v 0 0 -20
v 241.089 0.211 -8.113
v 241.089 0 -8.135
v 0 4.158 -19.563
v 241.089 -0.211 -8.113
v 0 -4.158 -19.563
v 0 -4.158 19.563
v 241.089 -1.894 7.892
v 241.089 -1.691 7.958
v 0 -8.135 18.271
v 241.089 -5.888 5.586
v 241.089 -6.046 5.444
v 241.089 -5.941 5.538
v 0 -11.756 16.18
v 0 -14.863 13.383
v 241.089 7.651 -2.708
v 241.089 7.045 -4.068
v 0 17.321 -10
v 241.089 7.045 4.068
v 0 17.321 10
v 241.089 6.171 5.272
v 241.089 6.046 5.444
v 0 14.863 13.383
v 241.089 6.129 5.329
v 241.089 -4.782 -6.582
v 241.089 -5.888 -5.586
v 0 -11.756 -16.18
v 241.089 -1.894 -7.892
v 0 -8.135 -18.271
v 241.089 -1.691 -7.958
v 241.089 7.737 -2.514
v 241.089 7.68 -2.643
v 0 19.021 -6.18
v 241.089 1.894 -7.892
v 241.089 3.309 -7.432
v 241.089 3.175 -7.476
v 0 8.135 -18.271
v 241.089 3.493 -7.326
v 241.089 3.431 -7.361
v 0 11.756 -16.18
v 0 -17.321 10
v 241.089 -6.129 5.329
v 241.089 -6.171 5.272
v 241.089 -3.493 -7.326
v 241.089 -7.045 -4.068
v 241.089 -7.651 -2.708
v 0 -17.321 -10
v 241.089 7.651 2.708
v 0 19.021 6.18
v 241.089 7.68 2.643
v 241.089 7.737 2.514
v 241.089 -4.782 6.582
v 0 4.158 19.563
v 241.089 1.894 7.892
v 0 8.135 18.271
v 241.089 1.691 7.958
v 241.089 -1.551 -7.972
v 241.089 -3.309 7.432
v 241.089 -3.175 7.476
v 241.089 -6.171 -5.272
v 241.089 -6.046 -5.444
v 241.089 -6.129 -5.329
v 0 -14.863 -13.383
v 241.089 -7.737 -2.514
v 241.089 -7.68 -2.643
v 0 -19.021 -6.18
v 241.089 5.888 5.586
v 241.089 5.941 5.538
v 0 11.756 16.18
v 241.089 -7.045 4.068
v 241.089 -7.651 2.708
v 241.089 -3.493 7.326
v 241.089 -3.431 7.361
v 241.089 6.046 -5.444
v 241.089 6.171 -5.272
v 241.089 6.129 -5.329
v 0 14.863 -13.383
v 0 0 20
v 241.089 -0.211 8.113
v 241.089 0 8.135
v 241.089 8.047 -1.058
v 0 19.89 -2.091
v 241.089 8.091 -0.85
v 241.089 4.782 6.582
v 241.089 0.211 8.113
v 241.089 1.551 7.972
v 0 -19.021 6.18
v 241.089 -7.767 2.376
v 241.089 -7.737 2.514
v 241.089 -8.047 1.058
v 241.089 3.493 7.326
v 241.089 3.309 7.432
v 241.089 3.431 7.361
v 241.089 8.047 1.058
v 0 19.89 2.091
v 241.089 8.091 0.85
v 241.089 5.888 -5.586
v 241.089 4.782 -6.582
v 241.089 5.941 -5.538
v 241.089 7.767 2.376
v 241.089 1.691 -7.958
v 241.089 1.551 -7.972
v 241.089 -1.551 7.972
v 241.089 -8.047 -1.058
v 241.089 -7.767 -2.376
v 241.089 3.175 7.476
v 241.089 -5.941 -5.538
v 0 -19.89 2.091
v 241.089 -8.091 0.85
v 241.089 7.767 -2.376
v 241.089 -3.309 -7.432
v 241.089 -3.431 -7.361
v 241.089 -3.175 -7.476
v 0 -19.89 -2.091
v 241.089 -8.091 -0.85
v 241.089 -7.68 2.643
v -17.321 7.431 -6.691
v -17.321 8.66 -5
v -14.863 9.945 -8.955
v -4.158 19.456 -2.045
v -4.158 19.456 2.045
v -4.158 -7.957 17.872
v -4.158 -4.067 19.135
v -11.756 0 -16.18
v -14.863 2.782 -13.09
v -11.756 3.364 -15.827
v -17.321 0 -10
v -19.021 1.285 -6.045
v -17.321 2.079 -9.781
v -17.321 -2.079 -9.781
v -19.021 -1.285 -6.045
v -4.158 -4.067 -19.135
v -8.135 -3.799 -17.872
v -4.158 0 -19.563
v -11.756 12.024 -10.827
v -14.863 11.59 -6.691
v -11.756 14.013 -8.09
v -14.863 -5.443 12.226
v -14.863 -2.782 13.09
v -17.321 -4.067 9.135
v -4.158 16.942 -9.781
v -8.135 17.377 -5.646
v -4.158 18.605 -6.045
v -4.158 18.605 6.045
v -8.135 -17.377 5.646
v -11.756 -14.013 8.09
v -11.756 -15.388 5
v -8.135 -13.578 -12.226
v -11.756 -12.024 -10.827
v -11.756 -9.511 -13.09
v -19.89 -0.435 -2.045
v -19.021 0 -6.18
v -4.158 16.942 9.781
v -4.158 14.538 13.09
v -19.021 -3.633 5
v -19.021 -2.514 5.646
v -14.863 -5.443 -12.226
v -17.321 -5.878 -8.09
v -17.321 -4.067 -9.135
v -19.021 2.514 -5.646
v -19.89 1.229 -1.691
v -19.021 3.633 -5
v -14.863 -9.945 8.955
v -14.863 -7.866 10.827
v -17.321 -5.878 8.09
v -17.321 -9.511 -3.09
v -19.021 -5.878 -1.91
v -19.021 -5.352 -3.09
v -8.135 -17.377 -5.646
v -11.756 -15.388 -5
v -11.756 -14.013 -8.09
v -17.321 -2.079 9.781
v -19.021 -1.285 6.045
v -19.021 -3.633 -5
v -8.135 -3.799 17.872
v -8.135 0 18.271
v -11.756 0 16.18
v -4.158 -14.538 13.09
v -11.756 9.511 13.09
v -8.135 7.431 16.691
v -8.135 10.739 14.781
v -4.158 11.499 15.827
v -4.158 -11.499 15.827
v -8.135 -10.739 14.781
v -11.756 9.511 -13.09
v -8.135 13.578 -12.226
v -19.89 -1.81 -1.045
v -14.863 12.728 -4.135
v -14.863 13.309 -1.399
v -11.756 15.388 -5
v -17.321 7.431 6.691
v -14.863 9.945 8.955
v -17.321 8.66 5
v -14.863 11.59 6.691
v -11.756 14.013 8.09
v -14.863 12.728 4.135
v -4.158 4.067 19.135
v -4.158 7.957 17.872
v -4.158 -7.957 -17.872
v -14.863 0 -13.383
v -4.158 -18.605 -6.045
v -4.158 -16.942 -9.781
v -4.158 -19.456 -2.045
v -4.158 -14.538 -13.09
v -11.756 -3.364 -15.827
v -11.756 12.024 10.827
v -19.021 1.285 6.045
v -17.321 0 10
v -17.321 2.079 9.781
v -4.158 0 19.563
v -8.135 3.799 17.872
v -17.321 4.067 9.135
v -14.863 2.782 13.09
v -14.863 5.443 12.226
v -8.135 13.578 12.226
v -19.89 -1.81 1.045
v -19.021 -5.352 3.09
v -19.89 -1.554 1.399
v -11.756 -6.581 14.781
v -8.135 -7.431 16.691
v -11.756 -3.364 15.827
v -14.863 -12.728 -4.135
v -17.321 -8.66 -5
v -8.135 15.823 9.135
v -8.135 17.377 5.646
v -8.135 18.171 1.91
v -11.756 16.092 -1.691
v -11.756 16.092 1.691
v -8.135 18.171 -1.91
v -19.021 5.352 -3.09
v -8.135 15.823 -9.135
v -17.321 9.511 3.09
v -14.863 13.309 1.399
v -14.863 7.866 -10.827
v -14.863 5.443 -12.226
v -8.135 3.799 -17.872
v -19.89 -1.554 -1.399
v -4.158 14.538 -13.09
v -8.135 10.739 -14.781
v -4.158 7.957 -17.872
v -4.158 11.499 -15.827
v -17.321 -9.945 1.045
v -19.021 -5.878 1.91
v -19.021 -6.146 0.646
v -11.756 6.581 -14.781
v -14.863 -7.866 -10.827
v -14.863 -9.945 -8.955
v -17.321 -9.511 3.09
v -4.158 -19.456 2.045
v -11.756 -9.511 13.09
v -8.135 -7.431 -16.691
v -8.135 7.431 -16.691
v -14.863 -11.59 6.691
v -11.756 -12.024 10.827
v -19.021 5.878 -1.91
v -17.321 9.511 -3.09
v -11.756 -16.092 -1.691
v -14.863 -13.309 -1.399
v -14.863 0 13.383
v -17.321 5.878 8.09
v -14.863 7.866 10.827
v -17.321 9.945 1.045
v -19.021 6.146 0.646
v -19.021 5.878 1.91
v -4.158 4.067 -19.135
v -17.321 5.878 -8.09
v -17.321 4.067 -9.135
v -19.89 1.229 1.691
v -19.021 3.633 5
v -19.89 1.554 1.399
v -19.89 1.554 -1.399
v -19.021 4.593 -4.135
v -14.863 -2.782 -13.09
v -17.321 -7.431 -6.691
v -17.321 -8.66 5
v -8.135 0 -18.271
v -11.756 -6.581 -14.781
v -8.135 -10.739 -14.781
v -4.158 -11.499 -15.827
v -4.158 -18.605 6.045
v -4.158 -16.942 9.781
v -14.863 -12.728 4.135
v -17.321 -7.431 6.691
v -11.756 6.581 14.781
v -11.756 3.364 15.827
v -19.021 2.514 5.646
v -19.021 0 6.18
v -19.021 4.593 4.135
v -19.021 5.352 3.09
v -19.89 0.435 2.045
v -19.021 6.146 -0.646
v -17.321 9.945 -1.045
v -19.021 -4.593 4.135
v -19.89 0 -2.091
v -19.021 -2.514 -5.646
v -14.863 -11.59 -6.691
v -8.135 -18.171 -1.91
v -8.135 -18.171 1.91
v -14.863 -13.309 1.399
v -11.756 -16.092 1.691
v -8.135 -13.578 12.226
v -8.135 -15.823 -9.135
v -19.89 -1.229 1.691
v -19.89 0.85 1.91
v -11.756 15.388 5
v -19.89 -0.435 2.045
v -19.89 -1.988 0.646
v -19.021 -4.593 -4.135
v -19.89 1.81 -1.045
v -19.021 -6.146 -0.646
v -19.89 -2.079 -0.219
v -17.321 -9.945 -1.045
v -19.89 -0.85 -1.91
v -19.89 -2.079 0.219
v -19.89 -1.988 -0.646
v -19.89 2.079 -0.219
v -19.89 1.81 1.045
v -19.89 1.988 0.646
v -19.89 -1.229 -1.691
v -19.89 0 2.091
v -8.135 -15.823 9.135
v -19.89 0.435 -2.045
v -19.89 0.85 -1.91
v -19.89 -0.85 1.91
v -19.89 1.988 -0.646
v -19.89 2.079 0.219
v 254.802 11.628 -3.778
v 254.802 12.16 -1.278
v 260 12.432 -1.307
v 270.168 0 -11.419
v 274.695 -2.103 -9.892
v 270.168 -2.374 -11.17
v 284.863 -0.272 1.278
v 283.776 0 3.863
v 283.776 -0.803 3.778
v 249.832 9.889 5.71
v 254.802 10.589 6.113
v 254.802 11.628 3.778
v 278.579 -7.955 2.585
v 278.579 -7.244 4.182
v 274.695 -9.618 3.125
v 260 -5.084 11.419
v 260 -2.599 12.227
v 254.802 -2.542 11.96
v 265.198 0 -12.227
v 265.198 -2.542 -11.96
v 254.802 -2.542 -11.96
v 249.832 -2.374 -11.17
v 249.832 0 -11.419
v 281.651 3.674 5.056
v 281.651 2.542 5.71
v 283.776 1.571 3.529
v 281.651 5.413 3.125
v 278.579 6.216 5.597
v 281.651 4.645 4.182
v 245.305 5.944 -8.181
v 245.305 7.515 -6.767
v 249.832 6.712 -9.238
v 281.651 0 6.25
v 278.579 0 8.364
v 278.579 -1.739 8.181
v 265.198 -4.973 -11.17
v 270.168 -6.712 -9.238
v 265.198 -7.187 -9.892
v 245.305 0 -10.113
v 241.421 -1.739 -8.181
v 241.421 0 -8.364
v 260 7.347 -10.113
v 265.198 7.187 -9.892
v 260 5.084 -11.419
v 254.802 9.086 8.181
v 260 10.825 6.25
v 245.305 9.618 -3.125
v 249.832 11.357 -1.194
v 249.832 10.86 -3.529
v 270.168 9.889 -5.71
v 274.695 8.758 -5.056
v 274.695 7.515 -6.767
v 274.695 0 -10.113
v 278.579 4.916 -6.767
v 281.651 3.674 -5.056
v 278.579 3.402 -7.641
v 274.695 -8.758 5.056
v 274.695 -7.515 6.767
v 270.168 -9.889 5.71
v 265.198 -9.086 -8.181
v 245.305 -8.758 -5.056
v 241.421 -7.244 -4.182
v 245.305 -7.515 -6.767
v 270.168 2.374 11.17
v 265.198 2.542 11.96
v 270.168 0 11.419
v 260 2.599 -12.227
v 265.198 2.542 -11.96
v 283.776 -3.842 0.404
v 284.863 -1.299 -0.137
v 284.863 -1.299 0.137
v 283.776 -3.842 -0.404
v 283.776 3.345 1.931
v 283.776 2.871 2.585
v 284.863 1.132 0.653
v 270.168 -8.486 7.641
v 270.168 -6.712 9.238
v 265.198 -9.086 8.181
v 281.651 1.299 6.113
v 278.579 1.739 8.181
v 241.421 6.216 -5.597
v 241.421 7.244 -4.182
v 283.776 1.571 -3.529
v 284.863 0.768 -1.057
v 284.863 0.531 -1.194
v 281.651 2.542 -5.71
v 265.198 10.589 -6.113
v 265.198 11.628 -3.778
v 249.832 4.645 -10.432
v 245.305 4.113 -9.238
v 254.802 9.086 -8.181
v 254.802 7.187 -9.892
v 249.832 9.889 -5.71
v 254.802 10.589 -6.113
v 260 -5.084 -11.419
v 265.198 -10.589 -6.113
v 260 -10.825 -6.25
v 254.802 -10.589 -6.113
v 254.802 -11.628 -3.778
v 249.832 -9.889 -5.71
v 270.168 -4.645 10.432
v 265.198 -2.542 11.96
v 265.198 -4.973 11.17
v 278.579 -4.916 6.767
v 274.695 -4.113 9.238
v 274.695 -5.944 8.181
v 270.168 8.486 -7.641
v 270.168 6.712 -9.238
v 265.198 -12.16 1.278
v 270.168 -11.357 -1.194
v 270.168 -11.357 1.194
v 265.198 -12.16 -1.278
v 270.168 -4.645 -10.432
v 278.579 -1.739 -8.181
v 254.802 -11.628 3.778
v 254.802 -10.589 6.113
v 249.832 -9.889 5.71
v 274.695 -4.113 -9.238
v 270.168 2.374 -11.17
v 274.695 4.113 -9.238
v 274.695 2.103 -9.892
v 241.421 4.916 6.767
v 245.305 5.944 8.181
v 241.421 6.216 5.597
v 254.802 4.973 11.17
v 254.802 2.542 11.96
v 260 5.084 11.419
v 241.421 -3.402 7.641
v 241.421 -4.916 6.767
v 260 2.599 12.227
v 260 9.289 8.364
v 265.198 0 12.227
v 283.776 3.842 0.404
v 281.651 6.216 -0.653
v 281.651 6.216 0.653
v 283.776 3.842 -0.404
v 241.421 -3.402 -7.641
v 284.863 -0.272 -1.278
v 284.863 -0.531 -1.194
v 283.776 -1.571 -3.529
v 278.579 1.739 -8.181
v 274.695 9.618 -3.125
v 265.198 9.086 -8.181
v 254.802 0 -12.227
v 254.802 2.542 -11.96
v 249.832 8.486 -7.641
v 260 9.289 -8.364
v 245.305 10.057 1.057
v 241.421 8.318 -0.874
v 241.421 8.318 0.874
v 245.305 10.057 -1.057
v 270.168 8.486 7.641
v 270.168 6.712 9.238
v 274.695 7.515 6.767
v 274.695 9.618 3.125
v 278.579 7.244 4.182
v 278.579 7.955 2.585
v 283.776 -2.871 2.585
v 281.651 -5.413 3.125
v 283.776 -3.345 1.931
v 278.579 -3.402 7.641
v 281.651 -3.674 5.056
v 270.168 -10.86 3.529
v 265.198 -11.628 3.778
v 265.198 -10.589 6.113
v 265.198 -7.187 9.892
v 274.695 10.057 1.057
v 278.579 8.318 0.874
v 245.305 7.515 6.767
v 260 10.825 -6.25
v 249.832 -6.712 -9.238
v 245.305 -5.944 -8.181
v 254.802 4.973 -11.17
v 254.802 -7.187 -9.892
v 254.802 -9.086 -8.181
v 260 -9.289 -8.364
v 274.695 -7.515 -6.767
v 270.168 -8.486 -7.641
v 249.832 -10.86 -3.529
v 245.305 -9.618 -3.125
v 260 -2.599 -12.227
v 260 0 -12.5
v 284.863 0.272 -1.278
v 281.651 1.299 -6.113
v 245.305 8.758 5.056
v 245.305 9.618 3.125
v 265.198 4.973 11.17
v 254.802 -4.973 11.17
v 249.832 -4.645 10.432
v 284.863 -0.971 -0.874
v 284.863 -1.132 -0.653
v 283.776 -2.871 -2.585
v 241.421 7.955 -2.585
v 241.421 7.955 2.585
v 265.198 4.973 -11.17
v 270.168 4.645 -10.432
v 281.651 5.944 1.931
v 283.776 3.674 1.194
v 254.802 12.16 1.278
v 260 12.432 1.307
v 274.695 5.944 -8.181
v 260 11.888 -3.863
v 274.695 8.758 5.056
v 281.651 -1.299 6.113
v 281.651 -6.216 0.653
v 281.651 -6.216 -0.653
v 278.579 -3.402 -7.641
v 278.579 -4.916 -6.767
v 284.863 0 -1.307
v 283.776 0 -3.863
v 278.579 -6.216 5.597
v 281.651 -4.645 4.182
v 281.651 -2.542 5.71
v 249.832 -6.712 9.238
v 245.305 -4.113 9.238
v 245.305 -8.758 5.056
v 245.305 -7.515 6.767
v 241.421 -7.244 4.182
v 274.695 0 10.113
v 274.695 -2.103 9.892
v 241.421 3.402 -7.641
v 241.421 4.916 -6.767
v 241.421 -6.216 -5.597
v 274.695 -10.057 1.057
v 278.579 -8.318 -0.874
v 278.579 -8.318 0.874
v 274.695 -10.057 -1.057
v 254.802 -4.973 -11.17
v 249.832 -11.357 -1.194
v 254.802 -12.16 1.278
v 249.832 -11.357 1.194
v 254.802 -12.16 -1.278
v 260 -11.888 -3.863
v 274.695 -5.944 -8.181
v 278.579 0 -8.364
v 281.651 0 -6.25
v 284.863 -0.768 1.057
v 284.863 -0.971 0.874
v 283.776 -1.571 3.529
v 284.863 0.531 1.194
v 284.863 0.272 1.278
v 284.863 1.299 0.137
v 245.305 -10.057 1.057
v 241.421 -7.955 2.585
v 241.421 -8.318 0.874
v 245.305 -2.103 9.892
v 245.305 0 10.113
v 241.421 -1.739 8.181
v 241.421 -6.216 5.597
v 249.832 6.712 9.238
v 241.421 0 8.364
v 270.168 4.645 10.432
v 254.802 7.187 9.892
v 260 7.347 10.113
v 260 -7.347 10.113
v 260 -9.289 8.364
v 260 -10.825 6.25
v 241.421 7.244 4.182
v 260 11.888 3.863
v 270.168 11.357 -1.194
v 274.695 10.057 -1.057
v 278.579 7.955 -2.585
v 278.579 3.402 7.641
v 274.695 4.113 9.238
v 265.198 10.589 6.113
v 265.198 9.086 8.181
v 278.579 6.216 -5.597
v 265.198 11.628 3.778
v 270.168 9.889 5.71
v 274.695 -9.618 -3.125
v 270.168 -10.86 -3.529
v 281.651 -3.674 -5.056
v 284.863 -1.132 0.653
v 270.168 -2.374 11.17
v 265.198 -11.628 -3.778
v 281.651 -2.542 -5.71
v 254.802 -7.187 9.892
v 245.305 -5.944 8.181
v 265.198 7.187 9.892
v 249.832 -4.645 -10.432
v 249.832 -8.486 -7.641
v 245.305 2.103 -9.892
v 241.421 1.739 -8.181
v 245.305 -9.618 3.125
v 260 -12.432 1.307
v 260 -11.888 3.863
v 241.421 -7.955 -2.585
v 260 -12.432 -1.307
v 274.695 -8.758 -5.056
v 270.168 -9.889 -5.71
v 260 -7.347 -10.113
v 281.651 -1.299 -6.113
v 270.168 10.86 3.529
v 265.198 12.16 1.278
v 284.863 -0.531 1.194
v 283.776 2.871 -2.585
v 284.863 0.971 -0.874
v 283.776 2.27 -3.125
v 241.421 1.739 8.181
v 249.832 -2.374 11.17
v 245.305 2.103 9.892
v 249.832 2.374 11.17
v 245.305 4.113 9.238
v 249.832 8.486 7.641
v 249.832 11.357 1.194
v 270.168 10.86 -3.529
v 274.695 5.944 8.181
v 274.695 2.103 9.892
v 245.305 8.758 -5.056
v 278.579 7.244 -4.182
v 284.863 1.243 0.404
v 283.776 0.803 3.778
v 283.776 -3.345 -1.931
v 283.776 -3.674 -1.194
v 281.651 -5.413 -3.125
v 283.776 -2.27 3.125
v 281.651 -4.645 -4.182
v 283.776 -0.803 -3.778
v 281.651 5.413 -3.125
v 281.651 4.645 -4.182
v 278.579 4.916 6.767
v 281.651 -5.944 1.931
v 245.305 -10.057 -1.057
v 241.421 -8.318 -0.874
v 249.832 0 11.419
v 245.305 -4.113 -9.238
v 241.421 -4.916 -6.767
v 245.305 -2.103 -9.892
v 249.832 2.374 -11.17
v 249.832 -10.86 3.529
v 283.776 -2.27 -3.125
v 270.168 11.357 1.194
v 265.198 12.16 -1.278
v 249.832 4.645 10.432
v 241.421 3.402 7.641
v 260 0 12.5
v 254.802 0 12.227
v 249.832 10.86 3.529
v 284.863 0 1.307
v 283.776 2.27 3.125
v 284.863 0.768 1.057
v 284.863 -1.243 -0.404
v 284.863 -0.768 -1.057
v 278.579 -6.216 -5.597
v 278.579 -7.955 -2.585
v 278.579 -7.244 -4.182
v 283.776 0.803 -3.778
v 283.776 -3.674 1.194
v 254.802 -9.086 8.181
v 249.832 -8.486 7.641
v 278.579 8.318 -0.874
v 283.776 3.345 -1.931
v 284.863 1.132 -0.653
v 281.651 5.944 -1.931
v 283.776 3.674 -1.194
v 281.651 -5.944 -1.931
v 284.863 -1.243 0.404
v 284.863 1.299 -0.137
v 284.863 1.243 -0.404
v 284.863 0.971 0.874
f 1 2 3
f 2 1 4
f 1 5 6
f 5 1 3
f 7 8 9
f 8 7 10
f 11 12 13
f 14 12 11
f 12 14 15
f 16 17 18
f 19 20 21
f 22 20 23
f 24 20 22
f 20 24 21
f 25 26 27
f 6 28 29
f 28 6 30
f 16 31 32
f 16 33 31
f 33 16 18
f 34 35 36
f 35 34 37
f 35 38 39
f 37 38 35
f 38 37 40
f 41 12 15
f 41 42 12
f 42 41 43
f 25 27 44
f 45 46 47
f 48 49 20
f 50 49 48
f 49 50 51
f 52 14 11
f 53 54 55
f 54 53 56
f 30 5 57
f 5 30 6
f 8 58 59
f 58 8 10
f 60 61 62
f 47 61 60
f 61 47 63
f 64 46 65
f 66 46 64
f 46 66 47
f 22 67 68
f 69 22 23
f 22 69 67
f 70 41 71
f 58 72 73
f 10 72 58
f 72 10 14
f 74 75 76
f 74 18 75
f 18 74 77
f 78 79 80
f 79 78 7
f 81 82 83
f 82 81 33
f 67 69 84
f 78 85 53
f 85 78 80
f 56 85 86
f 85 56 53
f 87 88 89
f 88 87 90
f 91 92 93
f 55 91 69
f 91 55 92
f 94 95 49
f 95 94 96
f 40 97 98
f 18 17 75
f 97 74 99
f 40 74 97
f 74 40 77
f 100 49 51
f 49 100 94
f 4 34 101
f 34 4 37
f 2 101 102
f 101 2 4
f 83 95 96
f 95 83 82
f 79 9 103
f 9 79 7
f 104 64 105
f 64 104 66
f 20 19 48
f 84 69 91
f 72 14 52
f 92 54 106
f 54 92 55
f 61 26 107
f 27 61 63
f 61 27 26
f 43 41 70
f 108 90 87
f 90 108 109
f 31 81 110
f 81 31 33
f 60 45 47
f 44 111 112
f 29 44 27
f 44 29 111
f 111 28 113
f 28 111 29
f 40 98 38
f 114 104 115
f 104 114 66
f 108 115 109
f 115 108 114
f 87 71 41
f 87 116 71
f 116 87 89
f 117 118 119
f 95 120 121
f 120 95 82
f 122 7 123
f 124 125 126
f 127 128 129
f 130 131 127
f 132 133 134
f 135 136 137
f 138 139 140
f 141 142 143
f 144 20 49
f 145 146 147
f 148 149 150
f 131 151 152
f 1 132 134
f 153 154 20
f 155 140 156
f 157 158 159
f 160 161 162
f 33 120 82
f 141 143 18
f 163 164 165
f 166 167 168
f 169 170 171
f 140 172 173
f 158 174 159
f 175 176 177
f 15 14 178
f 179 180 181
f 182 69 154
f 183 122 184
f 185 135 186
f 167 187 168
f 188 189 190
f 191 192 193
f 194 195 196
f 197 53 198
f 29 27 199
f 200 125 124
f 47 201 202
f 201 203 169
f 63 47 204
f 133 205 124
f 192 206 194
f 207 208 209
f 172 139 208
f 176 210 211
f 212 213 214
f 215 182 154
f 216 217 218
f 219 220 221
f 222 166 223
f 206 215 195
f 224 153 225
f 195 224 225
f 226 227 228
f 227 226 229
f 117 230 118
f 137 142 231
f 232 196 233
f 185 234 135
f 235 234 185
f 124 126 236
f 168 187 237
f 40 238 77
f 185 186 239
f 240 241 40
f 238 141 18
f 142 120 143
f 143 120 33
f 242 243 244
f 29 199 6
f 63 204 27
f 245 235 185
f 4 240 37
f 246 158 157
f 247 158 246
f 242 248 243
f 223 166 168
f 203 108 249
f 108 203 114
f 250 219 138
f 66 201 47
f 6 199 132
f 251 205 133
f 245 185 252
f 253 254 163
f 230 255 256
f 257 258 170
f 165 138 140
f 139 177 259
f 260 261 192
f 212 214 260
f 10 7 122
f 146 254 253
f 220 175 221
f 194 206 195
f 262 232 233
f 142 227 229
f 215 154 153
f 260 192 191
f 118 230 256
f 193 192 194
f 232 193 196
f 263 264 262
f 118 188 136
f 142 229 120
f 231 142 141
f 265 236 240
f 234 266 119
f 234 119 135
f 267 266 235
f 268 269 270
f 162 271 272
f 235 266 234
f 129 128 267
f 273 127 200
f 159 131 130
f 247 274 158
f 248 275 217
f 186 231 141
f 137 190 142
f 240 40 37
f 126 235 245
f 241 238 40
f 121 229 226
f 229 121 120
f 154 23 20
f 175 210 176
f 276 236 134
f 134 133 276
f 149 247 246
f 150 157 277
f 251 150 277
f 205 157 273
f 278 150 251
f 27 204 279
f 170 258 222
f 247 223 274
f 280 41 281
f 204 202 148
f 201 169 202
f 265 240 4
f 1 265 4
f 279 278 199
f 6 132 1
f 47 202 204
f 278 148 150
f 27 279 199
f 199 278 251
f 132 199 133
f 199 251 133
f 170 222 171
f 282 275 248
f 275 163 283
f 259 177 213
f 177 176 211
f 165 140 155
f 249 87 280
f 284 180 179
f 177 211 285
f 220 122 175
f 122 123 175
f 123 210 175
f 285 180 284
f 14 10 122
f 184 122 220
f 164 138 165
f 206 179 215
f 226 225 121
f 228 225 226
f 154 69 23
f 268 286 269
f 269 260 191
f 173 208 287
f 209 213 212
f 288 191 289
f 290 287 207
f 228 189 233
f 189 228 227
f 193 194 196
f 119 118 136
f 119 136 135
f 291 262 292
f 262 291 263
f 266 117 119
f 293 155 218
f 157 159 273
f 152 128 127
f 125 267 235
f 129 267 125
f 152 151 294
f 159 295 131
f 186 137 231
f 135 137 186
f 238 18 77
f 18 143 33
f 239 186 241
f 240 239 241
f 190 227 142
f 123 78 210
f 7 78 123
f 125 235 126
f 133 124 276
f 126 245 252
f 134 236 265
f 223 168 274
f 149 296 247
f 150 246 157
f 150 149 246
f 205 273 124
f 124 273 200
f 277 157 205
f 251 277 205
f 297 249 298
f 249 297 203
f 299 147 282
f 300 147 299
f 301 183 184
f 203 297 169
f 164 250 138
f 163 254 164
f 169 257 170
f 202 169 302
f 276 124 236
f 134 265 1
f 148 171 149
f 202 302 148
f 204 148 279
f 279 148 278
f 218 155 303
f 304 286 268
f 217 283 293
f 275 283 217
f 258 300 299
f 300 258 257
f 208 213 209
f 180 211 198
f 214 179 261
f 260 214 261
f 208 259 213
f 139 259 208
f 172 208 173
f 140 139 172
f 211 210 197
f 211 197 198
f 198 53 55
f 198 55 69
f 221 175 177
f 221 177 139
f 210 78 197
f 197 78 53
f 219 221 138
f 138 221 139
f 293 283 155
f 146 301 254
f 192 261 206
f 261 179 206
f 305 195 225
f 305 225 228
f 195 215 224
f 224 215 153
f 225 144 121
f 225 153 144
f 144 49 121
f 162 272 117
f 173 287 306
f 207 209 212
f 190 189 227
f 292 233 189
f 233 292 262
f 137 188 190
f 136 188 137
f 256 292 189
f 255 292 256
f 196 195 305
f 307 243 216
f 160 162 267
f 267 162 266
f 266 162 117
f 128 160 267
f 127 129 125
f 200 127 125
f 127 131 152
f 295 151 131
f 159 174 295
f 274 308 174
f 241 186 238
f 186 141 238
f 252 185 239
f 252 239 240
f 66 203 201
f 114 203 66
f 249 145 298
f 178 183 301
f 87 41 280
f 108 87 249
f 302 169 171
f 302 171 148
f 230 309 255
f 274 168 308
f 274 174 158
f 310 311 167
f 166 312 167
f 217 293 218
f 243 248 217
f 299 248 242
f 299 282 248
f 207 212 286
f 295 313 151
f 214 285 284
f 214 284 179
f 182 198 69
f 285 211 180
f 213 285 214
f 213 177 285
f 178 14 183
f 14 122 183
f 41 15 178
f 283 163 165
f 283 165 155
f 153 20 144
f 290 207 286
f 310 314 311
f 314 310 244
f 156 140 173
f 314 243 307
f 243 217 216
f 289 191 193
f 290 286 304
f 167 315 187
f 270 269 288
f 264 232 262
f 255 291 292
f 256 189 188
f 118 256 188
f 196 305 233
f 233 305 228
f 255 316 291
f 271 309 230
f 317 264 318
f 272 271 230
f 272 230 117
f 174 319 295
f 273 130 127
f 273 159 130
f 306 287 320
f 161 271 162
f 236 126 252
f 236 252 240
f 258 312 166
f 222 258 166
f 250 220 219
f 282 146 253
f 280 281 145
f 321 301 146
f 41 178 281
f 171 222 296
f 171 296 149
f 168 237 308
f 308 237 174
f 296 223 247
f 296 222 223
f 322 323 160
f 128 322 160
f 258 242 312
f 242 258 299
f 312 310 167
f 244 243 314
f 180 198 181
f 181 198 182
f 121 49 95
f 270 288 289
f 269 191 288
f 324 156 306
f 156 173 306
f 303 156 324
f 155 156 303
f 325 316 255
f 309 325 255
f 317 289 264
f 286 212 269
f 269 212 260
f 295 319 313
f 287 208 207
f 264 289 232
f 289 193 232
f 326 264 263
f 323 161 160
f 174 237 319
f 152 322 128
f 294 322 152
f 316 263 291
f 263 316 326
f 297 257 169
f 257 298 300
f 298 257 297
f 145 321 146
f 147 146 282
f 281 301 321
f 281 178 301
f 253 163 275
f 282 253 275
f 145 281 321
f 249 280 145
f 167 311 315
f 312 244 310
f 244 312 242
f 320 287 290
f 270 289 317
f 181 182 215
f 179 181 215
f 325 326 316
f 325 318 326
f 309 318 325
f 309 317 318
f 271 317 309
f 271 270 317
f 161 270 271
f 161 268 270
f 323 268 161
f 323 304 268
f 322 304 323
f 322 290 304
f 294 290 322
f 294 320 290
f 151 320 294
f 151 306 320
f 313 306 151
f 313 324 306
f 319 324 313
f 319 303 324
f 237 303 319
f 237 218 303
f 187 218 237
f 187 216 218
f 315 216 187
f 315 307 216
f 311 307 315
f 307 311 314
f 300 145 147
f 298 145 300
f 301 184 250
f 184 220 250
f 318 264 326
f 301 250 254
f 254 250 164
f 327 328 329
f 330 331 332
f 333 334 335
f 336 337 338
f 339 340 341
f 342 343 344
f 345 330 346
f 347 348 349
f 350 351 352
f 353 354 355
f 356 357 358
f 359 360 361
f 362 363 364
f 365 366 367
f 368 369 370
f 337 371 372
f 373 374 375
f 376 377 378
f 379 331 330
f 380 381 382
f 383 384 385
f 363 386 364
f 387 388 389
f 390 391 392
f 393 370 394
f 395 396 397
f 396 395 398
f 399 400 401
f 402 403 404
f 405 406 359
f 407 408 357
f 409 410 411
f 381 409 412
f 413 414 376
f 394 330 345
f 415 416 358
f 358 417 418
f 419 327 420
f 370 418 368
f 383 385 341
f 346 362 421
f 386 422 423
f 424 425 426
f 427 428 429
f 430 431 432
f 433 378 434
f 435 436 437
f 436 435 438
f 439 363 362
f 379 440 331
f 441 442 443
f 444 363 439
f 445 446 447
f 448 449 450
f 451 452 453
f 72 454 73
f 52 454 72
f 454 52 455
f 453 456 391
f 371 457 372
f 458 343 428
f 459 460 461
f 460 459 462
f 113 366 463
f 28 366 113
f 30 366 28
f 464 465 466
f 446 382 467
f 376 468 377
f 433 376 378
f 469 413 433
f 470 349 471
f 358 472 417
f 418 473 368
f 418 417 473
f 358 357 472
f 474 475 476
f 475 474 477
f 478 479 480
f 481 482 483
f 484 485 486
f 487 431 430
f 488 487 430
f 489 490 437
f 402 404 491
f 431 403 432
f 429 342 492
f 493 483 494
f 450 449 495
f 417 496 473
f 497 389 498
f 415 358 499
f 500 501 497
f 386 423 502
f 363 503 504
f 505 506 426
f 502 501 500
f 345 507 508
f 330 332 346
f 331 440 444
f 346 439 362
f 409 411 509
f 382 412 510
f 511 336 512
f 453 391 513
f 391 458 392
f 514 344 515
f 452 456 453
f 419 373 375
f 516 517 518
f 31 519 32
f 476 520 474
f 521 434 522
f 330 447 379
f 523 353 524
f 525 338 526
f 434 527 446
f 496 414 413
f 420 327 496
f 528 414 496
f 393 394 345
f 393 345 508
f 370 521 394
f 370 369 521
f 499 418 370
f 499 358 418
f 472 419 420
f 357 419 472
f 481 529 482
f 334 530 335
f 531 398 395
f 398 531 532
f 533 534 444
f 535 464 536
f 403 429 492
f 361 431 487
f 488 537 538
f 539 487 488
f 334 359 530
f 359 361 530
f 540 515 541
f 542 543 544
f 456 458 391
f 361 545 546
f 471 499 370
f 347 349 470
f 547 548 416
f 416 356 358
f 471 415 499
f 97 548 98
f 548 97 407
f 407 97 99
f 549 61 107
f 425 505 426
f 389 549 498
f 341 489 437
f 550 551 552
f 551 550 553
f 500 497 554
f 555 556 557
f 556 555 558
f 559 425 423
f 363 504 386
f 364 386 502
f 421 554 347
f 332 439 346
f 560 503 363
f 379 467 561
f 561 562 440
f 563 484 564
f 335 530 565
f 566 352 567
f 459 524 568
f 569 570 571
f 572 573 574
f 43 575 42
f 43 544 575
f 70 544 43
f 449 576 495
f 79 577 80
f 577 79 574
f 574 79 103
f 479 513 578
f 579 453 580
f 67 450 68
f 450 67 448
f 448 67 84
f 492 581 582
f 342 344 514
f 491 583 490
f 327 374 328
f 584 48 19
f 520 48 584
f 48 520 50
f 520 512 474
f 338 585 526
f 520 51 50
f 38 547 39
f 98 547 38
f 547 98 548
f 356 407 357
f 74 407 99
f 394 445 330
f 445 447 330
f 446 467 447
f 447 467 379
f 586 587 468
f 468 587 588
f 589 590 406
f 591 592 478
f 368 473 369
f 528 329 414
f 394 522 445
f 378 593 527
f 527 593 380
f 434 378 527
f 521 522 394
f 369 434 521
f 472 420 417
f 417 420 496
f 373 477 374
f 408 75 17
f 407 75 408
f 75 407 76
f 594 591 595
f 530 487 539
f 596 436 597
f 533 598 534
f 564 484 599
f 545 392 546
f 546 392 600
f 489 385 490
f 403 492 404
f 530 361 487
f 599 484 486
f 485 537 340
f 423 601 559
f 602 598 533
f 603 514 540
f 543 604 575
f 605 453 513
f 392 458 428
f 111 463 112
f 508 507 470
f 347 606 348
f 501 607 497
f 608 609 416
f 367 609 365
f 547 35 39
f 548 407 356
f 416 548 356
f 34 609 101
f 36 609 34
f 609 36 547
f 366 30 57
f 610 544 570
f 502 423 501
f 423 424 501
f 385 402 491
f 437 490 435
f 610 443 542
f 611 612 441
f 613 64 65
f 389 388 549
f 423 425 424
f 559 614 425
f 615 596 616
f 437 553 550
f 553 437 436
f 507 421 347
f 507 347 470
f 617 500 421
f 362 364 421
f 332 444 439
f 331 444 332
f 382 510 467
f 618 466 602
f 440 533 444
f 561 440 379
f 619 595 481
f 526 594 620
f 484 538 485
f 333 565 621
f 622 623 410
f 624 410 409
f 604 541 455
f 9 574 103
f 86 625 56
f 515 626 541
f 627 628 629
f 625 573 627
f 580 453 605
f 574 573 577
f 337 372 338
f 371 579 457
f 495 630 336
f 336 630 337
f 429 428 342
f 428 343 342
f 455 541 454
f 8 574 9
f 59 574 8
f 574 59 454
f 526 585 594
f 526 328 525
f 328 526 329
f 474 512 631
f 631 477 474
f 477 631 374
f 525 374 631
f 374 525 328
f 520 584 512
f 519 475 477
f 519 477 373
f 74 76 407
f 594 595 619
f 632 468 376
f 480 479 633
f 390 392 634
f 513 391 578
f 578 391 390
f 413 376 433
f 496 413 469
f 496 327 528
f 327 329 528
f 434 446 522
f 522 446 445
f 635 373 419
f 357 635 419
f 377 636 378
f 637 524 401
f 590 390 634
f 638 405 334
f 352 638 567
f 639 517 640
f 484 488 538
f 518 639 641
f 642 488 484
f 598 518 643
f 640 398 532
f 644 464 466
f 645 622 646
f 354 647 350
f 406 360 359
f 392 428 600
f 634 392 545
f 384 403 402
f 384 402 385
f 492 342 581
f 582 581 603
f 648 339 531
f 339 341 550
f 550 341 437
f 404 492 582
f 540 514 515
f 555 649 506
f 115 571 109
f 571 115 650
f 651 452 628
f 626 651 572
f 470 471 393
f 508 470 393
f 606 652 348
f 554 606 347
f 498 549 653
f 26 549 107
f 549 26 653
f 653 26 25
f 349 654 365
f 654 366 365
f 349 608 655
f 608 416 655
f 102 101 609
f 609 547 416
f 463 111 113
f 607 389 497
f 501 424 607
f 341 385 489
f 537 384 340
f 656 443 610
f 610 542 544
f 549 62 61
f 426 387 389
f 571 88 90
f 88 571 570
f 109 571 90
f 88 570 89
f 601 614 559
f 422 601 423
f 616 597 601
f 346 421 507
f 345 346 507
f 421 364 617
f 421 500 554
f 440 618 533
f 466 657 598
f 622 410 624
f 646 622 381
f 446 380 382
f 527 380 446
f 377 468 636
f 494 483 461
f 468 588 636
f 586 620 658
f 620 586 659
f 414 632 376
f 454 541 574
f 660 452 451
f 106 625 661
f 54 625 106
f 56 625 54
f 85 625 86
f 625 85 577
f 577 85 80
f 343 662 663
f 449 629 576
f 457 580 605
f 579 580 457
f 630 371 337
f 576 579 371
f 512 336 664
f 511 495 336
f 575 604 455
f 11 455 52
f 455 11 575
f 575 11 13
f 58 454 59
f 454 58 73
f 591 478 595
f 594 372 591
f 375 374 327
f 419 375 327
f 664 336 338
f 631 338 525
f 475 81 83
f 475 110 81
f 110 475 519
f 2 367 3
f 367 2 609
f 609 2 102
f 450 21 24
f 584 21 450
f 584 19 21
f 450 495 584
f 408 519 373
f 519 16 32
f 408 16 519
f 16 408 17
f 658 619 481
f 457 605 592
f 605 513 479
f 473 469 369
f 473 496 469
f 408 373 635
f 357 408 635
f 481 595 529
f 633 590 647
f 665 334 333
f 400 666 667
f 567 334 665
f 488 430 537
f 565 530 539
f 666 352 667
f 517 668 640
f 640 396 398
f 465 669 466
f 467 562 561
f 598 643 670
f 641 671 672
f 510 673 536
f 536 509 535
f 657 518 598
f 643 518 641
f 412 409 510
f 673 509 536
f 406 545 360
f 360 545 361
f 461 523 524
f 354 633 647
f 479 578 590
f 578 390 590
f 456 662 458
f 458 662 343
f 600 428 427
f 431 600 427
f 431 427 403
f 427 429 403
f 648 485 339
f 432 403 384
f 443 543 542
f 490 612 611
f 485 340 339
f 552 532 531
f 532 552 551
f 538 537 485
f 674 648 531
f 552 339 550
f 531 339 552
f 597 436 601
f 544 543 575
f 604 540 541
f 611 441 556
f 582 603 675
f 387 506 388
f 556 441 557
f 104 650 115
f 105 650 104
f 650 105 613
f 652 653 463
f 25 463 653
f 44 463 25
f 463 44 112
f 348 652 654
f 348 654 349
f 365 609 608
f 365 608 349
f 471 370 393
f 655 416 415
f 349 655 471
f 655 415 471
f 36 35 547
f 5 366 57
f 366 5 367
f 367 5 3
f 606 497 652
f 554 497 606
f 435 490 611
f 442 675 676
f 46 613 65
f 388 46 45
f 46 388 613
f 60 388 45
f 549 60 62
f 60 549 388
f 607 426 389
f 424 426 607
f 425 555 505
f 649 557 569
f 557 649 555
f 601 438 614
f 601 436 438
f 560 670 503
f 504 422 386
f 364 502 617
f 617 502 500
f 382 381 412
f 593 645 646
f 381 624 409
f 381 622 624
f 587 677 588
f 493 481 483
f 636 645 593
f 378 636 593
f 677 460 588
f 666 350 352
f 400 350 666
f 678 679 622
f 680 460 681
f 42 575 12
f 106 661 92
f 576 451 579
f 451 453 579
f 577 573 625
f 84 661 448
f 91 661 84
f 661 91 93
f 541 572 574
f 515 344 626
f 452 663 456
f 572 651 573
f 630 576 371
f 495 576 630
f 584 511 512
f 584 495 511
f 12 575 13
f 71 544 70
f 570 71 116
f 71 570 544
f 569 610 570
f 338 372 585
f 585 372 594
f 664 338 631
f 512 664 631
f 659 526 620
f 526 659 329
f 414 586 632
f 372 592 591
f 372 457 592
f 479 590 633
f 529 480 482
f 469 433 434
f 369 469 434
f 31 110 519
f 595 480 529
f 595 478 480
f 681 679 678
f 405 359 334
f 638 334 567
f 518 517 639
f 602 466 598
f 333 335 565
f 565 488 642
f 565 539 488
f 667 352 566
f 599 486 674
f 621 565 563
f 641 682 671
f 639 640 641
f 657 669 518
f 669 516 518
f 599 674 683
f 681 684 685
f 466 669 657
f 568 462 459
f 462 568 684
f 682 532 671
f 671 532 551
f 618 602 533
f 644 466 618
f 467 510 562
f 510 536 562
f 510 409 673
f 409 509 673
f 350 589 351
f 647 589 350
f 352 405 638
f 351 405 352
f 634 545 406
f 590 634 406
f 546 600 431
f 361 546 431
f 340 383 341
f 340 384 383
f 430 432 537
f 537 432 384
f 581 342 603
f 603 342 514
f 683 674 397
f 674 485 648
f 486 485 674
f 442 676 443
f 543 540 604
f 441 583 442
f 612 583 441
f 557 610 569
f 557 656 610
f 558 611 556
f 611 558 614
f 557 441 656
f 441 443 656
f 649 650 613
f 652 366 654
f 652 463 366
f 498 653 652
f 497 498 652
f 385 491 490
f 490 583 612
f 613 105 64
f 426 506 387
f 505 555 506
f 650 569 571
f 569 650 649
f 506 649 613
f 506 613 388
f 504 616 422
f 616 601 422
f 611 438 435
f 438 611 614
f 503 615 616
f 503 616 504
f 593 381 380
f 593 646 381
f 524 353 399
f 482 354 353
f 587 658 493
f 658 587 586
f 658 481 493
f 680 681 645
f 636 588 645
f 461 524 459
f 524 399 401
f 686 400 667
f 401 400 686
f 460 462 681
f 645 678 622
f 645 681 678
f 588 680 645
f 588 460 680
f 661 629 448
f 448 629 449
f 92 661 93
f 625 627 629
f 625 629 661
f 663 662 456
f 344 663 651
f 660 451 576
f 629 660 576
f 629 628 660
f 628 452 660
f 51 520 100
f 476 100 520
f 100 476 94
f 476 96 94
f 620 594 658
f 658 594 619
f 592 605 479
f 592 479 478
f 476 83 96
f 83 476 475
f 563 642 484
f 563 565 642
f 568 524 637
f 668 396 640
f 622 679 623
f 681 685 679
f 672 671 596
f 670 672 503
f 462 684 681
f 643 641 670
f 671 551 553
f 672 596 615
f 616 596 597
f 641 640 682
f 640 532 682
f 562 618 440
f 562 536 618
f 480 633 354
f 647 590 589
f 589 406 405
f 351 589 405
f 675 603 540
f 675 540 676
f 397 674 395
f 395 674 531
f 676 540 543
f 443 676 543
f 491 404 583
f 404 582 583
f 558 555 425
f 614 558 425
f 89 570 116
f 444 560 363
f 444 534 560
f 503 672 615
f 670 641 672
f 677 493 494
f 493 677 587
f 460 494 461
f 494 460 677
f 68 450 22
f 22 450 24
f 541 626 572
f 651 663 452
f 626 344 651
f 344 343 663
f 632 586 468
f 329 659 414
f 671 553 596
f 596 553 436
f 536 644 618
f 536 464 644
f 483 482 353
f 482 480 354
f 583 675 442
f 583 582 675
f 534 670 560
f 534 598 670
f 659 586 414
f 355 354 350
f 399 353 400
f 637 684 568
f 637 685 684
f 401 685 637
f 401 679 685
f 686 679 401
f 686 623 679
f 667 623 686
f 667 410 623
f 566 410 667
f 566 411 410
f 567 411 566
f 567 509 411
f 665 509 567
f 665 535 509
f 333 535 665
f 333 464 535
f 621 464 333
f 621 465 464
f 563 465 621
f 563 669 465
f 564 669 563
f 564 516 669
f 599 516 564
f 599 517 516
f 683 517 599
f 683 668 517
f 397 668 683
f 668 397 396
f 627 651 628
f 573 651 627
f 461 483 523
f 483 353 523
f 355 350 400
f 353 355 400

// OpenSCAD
rotate([0,90,0]) union()
{
    cylinder(254,20,7.5);
    sphere(20);
    translate([0,0,260])scale([1,1,2])sphere(12.5);
}
